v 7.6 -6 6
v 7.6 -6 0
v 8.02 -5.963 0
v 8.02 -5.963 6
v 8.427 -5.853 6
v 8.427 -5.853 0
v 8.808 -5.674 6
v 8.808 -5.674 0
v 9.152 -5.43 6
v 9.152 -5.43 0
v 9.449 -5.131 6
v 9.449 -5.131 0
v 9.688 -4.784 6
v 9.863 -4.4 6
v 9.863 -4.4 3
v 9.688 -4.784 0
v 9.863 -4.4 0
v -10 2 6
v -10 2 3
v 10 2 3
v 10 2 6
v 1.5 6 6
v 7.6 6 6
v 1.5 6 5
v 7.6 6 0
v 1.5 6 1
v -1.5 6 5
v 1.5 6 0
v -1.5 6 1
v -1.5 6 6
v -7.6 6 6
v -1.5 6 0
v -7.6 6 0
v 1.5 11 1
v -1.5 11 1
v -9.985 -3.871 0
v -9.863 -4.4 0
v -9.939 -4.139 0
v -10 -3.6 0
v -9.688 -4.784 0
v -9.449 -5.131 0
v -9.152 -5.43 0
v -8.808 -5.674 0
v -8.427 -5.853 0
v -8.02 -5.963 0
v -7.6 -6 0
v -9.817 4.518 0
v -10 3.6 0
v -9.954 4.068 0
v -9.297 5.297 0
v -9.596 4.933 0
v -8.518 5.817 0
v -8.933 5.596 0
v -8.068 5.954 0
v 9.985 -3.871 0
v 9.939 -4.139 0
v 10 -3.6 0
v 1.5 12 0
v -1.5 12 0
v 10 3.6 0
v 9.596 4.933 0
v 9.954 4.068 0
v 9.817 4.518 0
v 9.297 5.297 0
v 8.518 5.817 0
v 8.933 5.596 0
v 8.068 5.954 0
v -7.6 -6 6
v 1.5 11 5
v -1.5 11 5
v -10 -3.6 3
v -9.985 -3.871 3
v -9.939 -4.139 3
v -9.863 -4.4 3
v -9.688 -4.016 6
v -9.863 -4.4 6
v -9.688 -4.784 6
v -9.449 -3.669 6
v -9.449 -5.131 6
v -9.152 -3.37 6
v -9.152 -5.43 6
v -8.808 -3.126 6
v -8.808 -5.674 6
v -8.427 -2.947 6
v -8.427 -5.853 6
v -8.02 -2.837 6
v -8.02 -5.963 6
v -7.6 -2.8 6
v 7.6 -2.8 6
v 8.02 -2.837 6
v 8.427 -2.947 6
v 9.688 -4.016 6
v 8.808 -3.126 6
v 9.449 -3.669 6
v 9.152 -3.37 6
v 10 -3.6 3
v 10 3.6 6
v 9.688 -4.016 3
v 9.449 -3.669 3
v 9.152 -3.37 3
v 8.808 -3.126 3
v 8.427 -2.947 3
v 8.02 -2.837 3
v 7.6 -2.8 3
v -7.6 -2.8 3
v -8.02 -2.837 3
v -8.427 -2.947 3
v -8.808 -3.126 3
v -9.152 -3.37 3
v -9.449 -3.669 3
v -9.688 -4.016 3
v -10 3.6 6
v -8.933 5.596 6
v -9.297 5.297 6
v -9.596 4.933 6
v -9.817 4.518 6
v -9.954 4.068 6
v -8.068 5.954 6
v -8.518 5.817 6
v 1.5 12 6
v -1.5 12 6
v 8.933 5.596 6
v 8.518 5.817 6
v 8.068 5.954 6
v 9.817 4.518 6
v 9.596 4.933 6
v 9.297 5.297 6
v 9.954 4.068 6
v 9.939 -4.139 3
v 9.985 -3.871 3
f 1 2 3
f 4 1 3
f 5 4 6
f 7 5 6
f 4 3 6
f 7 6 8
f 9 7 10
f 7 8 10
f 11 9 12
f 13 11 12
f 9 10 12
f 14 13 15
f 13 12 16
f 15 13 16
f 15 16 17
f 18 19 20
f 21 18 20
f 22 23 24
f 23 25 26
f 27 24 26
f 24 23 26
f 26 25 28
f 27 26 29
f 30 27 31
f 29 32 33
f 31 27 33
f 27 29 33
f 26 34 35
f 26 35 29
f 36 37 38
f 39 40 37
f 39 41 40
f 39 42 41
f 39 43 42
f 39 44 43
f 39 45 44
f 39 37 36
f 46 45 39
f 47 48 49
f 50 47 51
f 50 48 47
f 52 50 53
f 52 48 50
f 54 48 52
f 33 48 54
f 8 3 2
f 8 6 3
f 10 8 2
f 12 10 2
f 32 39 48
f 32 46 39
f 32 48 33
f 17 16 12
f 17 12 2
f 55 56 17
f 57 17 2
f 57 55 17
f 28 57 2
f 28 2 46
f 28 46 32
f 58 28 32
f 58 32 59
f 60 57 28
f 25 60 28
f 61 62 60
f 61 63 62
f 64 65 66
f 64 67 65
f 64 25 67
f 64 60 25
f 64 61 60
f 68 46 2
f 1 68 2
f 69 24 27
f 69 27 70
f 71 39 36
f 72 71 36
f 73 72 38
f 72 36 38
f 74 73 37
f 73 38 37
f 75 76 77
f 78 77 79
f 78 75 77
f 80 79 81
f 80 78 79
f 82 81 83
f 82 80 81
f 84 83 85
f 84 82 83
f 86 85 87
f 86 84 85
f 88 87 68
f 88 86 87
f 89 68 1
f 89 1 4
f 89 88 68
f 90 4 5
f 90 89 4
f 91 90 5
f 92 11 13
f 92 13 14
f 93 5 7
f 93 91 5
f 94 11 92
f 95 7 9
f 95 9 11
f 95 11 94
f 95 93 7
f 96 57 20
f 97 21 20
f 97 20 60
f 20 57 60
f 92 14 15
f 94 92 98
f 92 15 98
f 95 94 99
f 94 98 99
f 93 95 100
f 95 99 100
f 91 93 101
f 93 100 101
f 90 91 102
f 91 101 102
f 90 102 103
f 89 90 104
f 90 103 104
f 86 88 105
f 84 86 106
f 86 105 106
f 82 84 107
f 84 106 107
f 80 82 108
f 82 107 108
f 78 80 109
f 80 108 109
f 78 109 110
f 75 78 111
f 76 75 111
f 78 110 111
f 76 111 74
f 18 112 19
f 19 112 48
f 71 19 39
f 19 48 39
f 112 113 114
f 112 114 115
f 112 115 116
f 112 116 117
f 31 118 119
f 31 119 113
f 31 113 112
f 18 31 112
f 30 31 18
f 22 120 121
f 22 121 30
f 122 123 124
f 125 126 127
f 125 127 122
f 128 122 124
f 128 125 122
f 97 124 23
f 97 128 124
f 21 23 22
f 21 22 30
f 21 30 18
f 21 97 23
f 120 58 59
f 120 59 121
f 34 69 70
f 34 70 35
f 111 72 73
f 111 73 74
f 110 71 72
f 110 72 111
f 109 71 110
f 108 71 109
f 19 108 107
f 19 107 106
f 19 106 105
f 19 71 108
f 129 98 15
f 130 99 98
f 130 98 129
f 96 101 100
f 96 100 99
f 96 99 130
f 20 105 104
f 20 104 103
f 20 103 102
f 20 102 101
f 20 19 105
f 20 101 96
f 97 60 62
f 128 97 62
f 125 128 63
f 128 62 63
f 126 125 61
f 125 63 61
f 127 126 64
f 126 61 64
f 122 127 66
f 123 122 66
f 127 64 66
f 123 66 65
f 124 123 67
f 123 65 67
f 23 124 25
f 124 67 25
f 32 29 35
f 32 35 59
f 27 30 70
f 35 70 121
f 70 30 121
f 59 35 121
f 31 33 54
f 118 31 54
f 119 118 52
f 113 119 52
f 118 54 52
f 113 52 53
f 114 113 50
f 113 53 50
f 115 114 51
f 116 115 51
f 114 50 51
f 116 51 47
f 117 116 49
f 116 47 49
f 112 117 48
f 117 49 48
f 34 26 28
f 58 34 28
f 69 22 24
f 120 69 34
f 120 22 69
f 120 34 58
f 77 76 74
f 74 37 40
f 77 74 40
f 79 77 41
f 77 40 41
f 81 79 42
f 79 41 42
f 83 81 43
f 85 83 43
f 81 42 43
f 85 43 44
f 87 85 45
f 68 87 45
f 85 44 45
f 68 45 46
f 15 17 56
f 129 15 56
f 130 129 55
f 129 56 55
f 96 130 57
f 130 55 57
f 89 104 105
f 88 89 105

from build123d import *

# Parameters (mm, degrees)
F1_DEPTH      = 3
F2_DEPTH      = 6
F4_DEPTH      = 1.5
F4_DEPTH_BACK = 1.5


with BuildPart() as f1:
    # F0 (on Top) → F1 (new body)
    with BuildSketch(Plane.XY):
        with BuildLine():
            ThreePointArc((5.811145618, 2), (5.4091097712, 4.5797958998), (7.6000000059, 6))
            Line((7.6000000059, 6), (-7.5999999941, 6))
            ThreePointArc((-7.5999999941, 6), (-5.9029437231, 5.2970562728), (-5.2, 3.6))
            ThreePointArc((-5.2, 3.6), (-5.3579863385, 2.7436269845), (-5.811145618, 2))
            Line((-5.811145618, 2), (5.811145618, 2))
        make_face()
        with BuildLine():
            ThreePointArc((7.6, -6), (8.9856406461, -5.5595917942), (9.8627416998, -4.4))
            ThreePointArc((9.8627416998, -4.4), (8.9856406461, -3.2404082058), (7.6, -2.8))
            ThreePointArc((7.6, -2.8), (6.2143593539, -3.2404082058), (5.3372583002, -4.4))
            ThreePointArc((5.3372583002, -4.4), (6.2143593539, -5.5595917942), (7.6, -6))
        make_face()
        with BuildLine():
            ThreePointArc((9.8627416998, -4.4), (9.9654365432, -4.0058447489), (10, -3.6))
            ThreePointArc((10, -3.6), (8.0058447489, -1.2345634568), (5.3372583002, -2.8))
            Line((5.3372583002, -2.8), (7.6, -2.8))
            ThreePointArc((7.6, -2.8), (8.9856406461, -3.2404082058), (9.8627416998, -4.4))
        make_face()
        with BuildLine():
            ThreePointArc((7.6, -6), (6.2143593539, -5.5595917942), (5.3372583002, -4.4))
            ThreePointArc((5.3372583002, -4.4), (5.2, -5.2), (5.3372583002, -6))
            Line((5.3372583002, -6), (7.6, -6))
        make_face()
        with BuildLine():
            ThreePointArc((-5.3372583002, -4.4), (-6.2143593453, -5.5595917881), (-7.5999999788, -6))
            Line((-7.5999999788, -6), (-5.3372583002, -6))
            ThreePointArc((-5.3372583002, -6), (-5.2345634568, -5.6058447489), (-5.2, -5.2))
            ThreePointArc((-5.2, -5.2), (-5.2345634568, -4.7941552511), (-5.3372583002, -4.4))
        make_face()
        with BuildLine():
            ThreePointArc((-7.6, -2.8), (-8.9856406461, -3.2404082058), (-9.8627416998, -4.4))
            ThreePointArc((-9.8627416998, -4.4), (-8.9856406374, -5.5595918003), (-7.5999999788, -6))
            ThreePointArc((-7.5999999788, -6), (-6.2143593453, -5.5595917881), (-5.3372583002, -4.4))
            ThreePointArc((-5.3372583002, -4.4), (-6.2143593539, -3.2404082058), (-7.6, -2.8))
        make_face()
        with BuildLine():
            ThreePointArc((-5.3372583002, -2.8), (-8.0058447489, -1.2345634568), (-10, -3.6))
            ThreePointArc((-10, -3.6), (-9.9654365432, -4.0058447489), (-9.8627416998, -4.4))
            ThreePointArc((-9.8627416998, -4.4), (-8.9856406461, -3.2404082058), (-7.6, -2.8))
            Line((-7.6, -2.8), (-5.3372583002, -2.8))
        make_face()
        with BuildLine():
            ThreePointArc((-5.2, 3.6), (-5.9029437231, 5.2970562728), (-7.5999999941, 6))
            ThreePointArc((-7.5999999941, 6), (-9.2970562728, 5.2970562769), (-10, 3.6))
            ThreePointArc((-10, 3.6), (-9.8420136615, 2.7436269845), (-9.388854382, 2))
            Line((-9.388854382, 2), (-5.811145618, 2))
            ThreePointArc((-5.811145618, 2), (-5.3579863385, 2.7436269845), (-5.2, 3.6))
        make_face()
        with BuildLine():
            ThreePointArc((10, 3.6), (9.2970562769, 5.2970562728), (7.6000000059, 6))
            ThreePointArc((7.6000000059, 6), (5.4091097712, 4.5797958998), (5.811145618, 2))
            Line((5.811145618, 2), (9.388854382, 2))
            ThreePointArc((9.388854382, 2), (9.8420136615, 2.7436269845), (10, 3.6))
        make_face()
        with BuildLine():
            ThreePointArc((5.3372583002, -4.4), (5.2, -3.6), (5.3372583002, -2.8))
            Line((5.3372583002, -2.8), (-5.3372583002, -2.8))
            ThreePointArc((-5.3372583002, -2.8), (-5.2345634568, -3.1941552511), (-5.2, -3.6))
            ThreePointArc((-5.2, -3.6), (-5.2345634568, -4.0058447489), (-5.3372583002, -4.4))
            ThreePointArc((-5.3372583002, -4.4), (-5.2345634568, -4.7941552511), (-5.2, -5.2))
            ThreePointArc((-5.2, -5.2), (-5.2345634568, -5.6058447489), (-5.3372583002, -6))
            Line((-5.3372583002, -6), (5.3372583002, -6))
            ThreePointArc((5.3372583002, -6), (5.2, -5.2), (5.3372583002, -4.4))
        make_face()
        with BuildLine():
            ThreePointArc((-5.2, -3.6), (-5.2345634568, -3.1941552511), (-5.3372583002, -2.8))
            Line((-5.3372583002, -2.8), (-7.6, -2.8))
            ThreePointArc((-7.6, -2.8), (-6.2143593539, -3.2404082058), (-5.3372583002, -4.4))
            ThreePointArc((-5.3372583002, -4.4), (-5.2345634568, -4.0058447489), (-5.2, -3.6))
        make_face()
        with BuildLine():
            Line((7.6, -2.8), (5.3372583002, -2.8))
            ThreePointArc((5.3372583002, -2.8), (5.2, -3.6), (5.3372583002, -4.4))
            ThreePointArc((5.3372583002, -4.4), (6.2143593539, -3.2404082058), (7.6, -2.8))
        make_face()
        with BuildLine():
            ThreePointArc((9.388854382, 2), (7.6, 1.2), (5.811145618, 2))
            Line((5.811145618, 2), (-5.811145618, 2))
            ThreePointArc((-5.811145618, 2), (-7.6, 1.2), (-9.388854382, 2))
            Line((-9.388854382, 2), (-10, 2))
            Line((-10, 2), (-10, -3.6))
            ThreePointArc((-10, -3.6), (-8.0058447489, -1.2345634568), (-5.3372583002, -2.8))
            Line((-5.3372583002, -2.8), (5.3372583002, -2.8))
            ThreePointArc((5.3372583002, -2.8), (8.0058447489, -1.2345634568), (10, -3.6))
            Line((10, -3.6), (10, 2))
            Line((10, 2), (9.388854382, 2))
        make_face()
        with BuildLine():
            Line((9.388854382, 2), (5.811145618, 2))
            ThreePointArc((5.811145618, 2), (7.6, 1.2), (9.388854382, 2))
        make_face()
        with BuildLine():
            ThreePointArc((-9.388854382, 2), (-7.6, 1.2), (-5.811145618, 2))
            Line((-5.811145618, 2), (-9.388854382, 2))
        make_face()
        with BuildLine():
            ThreePointArc((-9.388854382, 2), (-9.8420136615, 2.7436269845), (-10, 3.6))
            Line((-10, 3.6), (-10, 2))
            Line((-10, 2), (-9.388854382, 2))
        make_face()
        with BuildLine():
            Line((10, 2), (10, 3.6))
            ThreePointArc((10, 3.6), (9.8420136615, 2.7436269845), (9.388854382, 2))
            Line((9.388854382, 2), (10, 2))
        make_face()
    extrude(amount=F1_DEPTH)

    # F0 (on Top) → F2 (join)
    with BuildSketch(Plane.XY):
        with BuildLine():
            ThreePointArc((5.3372583002, -4.4), (5.2, -3.6), (5.3372583002, -2.8))
            Line((5.3372583002, -2.8), (-5.3372583002, -2.8))
            ThreePointArc((-5.3372583002, -2.8), (-5.2345634568, -3.1941552511), (-5.2, -3.6))
            ThreePointArc((-5.2, -3.6), (-5.2345634568, -4.0058447489), (-5.3372583002, -4.4))
            ThreePointArc((-5.3372583002, -4.4), (-5.2345634568, -4.7941552511), (-5.2, -5.2))
            ThreePointArc((-5.2, -5.2), (-5.2345634568, -5.6058447489), (-5.3372583002, -6))
            Line((-5.3372583002, -6), (5.3372583002, -6))
            ThreePointArc((5.3372583002, -6), (5.2, -5.2), (5.3372583002, -4.4))
        make_face()
        with BuildLine():
            ThreePointArc((-7.6, -2.8), (-8.9856406461, -3.2404082058), (-9.8627416998, -4.4))
            ThreePointArc((-9.8627416998, -4.4), (-8.9856406374, -5.5595918003), (-7.5999999788, -6))
            ThreePointArc((-7.5999999788, -6), (-6.2143593453, -5.5595917881), (-5.3372583002, -4.4))
            ThreePointArc((-5.3372583002, -4.4), (-6.2143593539, -3.2404082058), (-7.6, -2.8))
        make_face()
        with BuildLine():
            ThreePointArc((-5.3372583002, -4.4), (-6.2143593453, -5.5595917881), (-7.5999999788, -6))
            Line((-7.5999999788, -6), (-5.3372583002, -6))
            ThreePointArc((-5.3372583002, -6), (-5.2345634568, -5.6058447489), (-5.2, -5.2))
            ThreePointArc((-5.2, -5.2), (-5.2345634568, -4.7941552511), (-5.3372583002, -4.4))
        make_face()
        with BuildLine():
            ThreePointArc((-5.2, -3.6), (-5.2345634568, -3.1941552511), (-5.3372583002, -2.8))
            Line((-5.3372583002, -2.8), (-7.6, -2.8))
            ThreePointArc((-7.6, -2.8), (-6.2143593539, -3.2404082058), (-5.3372583002, -4.4))
            ThreePointArc((-5.3372583002, -4.4), (-5.2345634568, -4.0058447489), (-5.2, -3.6))
        make_face()
        with BuildLine():
            ThreePointArc((7.6, -6), (8.9856406461, -5.5595917942), (9.8627416998, -4.4))
            ThreePointArc((9.8627416998, -4.4), (8.9856406461, -3.2404082058), (7.6, -2.8))
            ThreePointArc((7.6, -2.8), (6.2143593539, -3.2404082058), (5.3372583002, -4.4))
            ThreePointArc((5.3372583002, -4.4), (6.2143593539, -5.5595917942), (7.6, -6))
        make_face()
        with BuildLine():
            ThreePointArc((7.6, -6), (6.2143593539, -5.5595917942), (5.3372583002, -4.4))
            ThreePointArc((5.3372583002, -4.4), (5.2, -5.2), (5.3372583002, -6))
            Line((5.3372583002, -6), (7.6, -6))
        make_face()
        with BuildLine():
            Line((7.6, -2.8), (5.3372583002, -2.8))
            ThreePointArc((5.3372583002, -2.8), (5.2, -3.6), (5.3372583002, -4.4))
            ThreePointArc((5.3372583002, -4.4), (6.2143593539, -3.2404082058), (7.6, -2.8))
        make_face()
        with BuildLine():
            ThreePointArc((-5.2, 3.6), (-5.9029437231, 5.2970562728), (-7.5999999941, 6))
            ThreePointArc((-7.5999999941, 6), (-9.2970562728, 5.2970562769), (-10, 3.6))
            ThreePointArc((-10, 3.6), (-9.8420136615, 2.7436269845), (-9.388854382, 2))
            Line((-9.388854382, 2), (-5.811145618, 2))
            ThreePointArc((-5.811145618, 2), (-5.3579863385, 2.7436269845), (-5.2, 3.6))
        make_face()
        with BuildLine():
            ThreePointArc((5.811145618, 2), (5.4091097712, 4.5797958998), (7.6000000059, 6))
            Line((7.6000000059, 6), (-7.5999999941, 6))
            ThreePointArc((-7.5999999941, 6), (-5.9029437231, 5.2970562728), (-5.2, 3.6))
            ThreePointArc((-5.2, 3.6), (-5.3579863385, 2.7436269845), (-5.811145618, 2))
            Line((-5.811145618, 2), (5.811145618, 2))
        make_face()
        with BuildLine():
            ThreePointArc((10, 3.6), (9.2970562769, 5.2970562728), (7.6000000059, 6))
            ThreePointArc((7.6000000059, 6), (5.4091097712, 4.5797958998), (5.811145618, 2))
            Line((5.811145618, 2), (9.388854382, 2))
            ThreePointArc((9.388854382, 2), (9.8420136615, 2.7436269845), (10, 3.6))
        make_face()
        with BuildLine():
            Line((10, 2), (10, 3.6))
            ThreePointArc((10, 3.6), (9.8420136615, 2.7436269845), (9.388854382, 2))
            Line((9.388854382, 2), (10, 2))
        make_face()
        with BuildLine():
            ThreePointArc((-9.388854382, 2), (-9.8420136615, 2.7436269845), (-10, 3.6))
            Line((-10, 3.6), (-10, 2))
            Line((-10, 2), (-9.388854382, 2))
        make_face()
    extrude(amount=F2_DEPTH)

    # F3 (on Right) → F4 (join, two sides)
    with BuildSketch(Plane.YZ) as f4_sk:
        Polygon((6, 1), (6, 0), (12, 0), (12, 6), (6, 6), (6, 5), (11, 5), (11, 1), align=None)
    extrude(amount=F4_DEPTH)
    extrude(f4_sk.sketch, amount=-F4_DEPTH_BACK)


solid = f1.part
